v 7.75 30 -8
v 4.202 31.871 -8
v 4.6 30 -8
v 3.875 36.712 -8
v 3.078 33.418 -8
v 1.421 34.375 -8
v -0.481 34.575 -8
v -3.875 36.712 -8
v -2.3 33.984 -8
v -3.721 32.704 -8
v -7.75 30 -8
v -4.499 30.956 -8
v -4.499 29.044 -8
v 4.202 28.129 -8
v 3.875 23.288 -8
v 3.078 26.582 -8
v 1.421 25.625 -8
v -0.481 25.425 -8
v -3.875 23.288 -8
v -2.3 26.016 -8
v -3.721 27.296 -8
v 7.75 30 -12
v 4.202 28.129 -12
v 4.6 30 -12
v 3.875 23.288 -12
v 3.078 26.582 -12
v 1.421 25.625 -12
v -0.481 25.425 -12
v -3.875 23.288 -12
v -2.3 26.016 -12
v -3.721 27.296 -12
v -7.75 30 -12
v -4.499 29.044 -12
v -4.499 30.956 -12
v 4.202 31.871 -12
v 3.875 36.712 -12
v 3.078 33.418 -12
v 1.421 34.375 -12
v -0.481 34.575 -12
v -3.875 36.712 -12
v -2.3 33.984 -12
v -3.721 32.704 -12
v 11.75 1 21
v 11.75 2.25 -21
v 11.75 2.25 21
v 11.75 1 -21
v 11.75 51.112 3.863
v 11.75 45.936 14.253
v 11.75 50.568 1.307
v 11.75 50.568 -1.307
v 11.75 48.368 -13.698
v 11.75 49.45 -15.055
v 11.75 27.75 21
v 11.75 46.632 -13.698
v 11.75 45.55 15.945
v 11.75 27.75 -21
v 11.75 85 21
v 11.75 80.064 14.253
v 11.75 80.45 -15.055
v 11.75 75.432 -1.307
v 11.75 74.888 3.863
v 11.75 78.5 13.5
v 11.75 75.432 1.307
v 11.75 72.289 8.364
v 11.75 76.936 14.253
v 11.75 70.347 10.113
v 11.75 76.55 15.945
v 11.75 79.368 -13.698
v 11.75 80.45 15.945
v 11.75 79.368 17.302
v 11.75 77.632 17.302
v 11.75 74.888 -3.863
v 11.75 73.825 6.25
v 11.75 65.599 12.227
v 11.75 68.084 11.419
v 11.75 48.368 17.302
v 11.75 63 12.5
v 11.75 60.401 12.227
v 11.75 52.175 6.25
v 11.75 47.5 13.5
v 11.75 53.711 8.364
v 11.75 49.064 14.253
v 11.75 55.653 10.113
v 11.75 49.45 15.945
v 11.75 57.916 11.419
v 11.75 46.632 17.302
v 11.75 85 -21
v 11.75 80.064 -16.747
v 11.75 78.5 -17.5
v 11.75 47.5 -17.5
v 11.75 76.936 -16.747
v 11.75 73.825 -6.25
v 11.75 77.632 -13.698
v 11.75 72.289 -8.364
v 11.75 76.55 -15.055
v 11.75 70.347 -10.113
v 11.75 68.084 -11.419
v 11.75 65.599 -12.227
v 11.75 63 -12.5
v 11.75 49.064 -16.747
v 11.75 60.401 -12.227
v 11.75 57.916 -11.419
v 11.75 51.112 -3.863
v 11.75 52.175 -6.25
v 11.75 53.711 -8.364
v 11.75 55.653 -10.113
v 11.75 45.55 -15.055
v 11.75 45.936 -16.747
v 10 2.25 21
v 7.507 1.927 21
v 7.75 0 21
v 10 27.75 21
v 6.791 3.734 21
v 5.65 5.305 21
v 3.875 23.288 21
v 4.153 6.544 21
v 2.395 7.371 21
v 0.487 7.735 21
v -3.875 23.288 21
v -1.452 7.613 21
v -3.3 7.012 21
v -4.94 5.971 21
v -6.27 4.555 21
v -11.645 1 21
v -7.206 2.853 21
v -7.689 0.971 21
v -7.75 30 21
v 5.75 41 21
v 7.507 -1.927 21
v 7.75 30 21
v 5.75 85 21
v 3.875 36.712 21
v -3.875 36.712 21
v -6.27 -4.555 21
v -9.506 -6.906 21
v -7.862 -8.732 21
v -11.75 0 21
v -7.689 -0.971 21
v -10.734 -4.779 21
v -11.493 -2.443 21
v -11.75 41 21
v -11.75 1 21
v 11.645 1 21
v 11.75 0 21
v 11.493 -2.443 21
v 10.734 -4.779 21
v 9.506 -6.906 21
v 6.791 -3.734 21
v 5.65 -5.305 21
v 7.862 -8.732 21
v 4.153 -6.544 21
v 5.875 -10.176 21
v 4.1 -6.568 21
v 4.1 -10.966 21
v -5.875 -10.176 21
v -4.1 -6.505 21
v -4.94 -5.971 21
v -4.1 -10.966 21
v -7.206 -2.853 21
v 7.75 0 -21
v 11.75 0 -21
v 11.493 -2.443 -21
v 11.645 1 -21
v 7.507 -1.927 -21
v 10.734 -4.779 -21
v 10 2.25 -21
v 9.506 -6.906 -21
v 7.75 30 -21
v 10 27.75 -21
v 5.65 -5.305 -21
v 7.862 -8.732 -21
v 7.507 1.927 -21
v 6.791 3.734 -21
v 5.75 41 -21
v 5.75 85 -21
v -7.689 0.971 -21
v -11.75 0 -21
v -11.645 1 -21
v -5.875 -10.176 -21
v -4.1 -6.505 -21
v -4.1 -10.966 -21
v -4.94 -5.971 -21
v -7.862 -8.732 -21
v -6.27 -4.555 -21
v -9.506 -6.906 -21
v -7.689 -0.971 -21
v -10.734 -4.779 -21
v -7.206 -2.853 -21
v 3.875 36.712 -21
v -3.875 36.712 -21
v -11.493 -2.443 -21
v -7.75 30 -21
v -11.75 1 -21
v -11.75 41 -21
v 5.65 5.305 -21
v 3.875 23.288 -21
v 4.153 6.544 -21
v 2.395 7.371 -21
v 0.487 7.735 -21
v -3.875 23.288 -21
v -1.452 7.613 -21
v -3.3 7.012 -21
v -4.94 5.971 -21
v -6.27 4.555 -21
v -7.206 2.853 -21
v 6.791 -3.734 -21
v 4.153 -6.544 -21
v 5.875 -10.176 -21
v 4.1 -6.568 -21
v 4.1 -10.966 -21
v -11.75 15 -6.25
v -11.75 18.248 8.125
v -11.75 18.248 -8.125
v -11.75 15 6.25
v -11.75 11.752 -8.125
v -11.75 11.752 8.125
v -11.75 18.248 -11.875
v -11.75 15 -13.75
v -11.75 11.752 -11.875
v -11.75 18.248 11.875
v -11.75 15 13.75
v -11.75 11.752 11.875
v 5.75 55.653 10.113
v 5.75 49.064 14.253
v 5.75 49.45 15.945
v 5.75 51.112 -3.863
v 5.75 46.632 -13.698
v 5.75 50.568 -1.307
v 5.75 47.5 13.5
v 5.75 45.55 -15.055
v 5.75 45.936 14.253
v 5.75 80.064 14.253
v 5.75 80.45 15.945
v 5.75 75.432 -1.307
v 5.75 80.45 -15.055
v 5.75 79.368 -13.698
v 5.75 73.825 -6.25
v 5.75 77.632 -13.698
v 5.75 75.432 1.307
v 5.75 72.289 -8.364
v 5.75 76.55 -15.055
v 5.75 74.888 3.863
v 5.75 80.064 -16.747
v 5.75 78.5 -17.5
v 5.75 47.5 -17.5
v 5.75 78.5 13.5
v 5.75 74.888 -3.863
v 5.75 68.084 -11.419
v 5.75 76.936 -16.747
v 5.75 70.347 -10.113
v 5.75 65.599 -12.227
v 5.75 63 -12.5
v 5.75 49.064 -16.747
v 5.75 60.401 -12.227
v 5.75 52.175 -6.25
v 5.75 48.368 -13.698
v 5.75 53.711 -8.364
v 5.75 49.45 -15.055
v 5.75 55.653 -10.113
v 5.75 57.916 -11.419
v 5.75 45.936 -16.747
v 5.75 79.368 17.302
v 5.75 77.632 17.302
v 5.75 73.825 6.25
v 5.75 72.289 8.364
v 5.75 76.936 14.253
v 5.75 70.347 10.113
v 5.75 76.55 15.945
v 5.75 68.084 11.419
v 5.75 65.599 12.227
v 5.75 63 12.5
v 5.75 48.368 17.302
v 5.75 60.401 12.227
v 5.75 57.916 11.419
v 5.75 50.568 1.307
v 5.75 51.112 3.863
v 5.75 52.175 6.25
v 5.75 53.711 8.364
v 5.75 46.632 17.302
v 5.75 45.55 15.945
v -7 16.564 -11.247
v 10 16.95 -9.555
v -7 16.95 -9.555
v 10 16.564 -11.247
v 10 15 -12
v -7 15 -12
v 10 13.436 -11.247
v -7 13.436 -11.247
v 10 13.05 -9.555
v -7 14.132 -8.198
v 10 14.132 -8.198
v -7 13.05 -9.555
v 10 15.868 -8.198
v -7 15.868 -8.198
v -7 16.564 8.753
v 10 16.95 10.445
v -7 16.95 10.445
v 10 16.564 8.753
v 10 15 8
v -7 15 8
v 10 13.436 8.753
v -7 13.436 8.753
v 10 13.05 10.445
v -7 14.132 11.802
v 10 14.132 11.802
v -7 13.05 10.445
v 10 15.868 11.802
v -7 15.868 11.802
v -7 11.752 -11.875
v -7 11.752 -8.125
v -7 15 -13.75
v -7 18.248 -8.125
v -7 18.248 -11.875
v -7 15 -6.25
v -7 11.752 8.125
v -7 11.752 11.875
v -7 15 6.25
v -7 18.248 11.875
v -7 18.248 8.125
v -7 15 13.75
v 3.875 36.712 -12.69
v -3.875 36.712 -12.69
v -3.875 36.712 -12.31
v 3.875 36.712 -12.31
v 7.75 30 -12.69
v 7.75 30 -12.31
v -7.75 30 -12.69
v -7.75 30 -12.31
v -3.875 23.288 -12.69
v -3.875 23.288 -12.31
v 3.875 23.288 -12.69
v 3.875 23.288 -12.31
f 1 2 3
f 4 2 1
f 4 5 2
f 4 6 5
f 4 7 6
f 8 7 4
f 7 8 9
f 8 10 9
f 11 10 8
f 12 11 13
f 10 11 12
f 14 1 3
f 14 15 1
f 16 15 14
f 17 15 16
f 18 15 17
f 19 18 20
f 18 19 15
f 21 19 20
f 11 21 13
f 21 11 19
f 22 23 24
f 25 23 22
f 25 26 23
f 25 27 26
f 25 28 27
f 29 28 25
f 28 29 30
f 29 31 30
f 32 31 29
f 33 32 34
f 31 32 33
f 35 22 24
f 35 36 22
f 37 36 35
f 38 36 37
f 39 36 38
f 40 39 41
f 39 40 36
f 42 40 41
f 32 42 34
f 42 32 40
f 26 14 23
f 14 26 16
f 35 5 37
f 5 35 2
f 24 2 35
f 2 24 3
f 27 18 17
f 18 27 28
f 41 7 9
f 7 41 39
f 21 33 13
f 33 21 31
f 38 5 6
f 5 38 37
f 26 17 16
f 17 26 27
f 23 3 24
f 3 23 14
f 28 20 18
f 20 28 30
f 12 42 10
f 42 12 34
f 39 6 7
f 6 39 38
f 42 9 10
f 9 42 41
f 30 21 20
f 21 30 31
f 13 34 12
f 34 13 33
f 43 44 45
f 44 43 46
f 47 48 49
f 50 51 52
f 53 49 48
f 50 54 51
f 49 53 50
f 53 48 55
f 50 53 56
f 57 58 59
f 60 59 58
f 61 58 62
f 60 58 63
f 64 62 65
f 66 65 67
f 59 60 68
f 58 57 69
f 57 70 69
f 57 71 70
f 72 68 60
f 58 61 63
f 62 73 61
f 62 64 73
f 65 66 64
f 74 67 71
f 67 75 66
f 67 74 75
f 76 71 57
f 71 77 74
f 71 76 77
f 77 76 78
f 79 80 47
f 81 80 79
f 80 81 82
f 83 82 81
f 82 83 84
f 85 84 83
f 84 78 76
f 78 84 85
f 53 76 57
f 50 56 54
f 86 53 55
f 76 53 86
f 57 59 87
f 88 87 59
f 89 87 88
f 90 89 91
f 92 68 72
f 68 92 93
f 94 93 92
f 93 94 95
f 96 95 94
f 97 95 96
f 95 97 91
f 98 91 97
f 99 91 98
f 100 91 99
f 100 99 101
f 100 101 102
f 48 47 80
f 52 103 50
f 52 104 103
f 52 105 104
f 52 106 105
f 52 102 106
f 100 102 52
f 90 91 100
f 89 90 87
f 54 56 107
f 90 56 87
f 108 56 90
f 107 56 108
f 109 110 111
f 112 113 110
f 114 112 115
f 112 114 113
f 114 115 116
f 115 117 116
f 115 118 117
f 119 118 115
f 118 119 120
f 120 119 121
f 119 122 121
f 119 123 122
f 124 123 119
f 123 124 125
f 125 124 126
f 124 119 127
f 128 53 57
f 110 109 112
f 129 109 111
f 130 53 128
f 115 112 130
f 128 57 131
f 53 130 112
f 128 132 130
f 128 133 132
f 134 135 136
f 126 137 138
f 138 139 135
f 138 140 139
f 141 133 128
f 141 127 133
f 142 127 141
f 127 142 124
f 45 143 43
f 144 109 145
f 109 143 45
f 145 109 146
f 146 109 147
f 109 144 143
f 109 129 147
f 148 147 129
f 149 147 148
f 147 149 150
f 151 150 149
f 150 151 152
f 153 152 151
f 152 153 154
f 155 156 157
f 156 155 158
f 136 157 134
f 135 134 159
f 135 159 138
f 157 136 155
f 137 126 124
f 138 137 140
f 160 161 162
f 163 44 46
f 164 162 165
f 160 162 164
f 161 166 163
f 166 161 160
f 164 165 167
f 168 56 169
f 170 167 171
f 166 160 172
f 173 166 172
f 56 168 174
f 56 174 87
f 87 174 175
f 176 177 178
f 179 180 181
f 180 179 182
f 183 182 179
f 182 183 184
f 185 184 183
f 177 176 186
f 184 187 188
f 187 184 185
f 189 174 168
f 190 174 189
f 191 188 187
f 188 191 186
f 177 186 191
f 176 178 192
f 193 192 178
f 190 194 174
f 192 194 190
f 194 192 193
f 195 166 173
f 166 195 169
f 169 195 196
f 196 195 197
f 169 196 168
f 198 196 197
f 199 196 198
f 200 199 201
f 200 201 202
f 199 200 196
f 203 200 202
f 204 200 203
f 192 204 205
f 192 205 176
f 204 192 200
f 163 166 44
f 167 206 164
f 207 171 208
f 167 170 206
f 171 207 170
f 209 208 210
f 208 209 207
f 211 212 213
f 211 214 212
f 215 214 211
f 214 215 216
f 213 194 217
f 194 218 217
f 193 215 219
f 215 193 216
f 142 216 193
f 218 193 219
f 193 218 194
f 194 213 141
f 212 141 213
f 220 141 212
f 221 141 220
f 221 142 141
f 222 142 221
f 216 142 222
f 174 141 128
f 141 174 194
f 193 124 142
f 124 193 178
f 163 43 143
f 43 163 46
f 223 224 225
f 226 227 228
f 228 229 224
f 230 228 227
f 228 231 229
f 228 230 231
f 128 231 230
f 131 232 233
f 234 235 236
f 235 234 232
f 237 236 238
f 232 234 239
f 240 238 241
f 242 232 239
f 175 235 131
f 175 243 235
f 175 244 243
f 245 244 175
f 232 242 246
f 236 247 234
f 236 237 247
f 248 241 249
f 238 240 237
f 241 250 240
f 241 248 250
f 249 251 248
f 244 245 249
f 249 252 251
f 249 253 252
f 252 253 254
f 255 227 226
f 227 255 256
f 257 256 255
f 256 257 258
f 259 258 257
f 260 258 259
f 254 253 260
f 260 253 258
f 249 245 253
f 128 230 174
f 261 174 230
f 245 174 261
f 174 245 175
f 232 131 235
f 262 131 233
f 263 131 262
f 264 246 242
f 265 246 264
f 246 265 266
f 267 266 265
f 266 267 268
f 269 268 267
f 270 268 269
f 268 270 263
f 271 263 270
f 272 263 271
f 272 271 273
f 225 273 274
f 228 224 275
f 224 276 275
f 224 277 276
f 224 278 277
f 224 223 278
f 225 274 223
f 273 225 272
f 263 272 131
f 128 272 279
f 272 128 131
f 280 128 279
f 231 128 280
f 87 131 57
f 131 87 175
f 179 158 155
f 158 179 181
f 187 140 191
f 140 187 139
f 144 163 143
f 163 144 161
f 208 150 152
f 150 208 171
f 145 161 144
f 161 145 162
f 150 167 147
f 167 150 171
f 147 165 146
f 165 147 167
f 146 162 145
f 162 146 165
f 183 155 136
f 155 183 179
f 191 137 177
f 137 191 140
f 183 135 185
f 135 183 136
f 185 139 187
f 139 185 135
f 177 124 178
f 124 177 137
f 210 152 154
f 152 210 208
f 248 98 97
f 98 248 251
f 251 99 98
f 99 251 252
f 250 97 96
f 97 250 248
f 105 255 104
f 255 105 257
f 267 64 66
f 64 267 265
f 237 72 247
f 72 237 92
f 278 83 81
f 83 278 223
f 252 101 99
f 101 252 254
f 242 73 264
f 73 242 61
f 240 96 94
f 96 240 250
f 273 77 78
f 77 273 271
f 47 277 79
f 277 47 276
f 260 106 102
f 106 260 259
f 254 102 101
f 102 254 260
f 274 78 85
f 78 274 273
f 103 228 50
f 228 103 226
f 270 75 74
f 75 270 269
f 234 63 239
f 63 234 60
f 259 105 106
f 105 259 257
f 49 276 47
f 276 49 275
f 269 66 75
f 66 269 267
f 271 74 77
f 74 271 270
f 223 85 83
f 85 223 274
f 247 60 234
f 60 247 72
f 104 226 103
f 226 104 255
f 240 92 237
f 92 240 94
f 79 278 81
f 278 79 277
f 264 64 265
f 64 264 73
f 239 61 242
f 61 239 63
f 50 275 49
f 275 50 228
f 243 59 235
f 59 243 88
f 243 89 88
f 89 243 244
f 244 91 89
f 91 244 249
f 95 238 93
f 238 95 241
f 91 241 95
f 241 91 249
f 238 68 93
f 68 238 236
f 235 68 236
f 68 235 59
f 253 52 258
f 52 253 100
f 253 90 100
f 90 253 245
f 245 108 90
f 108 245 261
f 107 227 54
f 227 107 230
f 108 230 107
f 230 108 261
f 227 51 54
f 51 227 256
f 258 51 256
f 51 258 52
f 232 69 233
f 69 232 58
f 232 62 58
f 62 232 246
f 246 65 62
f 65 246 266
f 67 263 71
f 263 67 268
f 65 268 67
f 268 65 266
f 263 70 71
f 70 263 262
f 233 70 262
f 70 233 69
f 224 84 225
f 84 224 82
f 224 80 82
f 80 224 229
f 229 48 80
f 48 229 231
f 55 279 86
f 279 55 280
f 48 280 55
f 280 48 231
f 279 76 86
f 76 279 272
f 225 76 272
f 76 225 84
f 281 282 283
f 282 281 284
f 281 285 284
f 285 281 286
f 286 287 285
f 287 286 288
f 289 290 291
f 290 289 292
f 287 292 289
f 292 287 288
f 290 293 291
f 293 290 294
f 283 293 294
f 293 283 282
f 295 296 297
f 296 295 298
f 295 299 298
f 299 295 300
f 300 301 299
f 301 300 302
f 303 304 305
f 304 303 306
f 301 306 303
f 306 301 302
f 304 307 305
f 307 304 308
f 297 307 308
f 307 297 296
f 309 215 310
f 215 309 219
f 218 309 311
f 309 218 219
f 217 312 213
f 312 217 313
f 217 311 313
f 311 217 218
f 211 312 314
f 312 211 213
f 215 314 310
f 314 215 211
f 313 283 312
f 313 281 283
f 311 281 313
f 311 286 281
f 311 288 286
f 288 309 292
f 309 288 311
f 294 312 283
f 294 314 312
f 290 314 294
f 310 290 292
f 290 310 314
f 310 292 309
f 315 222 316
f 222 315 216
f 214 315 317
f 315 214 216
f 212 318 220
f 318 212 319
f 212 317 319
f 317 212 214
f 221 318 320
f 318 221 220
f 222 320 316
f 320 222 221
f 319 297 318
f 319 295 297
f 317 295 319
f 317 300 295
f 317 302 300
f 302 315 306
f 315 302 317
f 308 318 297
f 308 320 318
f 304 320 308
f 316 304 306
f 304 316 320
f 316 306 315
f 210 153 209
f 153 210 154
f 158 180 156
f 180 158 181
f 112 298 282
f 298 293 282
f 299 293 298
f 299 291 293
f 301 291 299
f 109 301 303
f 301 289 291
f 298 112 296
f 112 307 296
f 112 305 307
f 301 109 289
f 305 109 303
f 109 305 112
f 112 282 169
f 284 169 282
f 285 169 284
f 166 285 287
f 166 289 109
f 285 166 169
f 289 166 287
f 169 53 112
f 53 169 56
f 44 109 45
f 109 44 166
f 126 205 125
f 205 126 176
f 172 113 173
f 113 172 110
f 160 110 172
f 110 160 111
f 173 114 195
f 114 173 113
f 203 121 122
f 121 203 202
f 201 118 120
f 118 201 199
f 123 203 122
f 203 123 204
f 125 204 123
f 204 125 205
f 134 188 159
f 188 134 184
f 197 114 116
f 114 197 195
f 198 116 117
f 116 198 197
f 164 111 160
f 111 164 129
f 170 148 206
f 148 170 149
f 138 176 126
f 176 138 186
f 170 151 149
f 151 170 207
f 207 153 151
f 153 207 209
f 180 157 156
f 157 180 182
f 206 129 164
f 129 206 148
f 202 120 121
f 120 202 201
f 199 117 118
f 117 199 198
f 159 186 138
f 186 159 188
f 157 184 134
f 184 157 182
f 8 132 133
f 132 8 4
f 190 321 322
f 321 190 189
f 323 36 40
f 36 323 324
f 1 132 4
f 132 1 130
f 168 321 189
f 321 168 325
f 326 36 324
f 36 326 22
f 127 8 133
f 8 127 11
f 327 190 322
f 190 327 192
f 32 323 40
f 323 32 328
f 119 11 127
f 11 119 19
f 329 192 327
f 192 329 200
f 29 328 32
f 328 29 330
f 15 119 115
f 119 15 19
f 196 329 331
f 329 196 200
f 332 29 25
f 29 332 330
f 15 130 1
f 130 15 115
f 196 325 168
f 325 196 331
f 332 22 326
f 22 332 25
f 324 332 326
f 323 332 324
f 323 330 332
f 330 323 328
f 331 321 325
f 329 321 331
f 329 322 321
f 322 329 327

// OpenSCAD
// file: Rook_Config.scad
// Rook 3D Printer Configuration
// Created By Jeffrey Olijar 
// Jolijar@gmail.com
// Revision 1.02

// Layer Height
LH = 0.38;

// 608 skate bearing
Bearing_OD = 22.5; 
Bearing_ID = 8;
Bearing_H = 7;

// M3 Nut Diameter
N3 = 7.5;

// M4 Screw Hole Diameter
M4 = 4;

// M5 Screw Hole Diameter
M5 = 5;

// M8 Rod Diameter (configure for a tight fit)
M8 = 8.2;

// M8 Nut Diameter
N8 = 15.5;

//LM8UU Bearing
LBD = 15.5; // Diameter
LBH = 25; // Height
LBI = 8;  // Inner Diameter

//Makergear Groovemount
GVO = 16.5; // Outside Diameter
GVI = 12.5;  // Inside Groove Diameter

// Distance Between Centers for X rods
DBCX = 70;
// main file
// Rook 3D Printer 
// X Motor Holder
// Created By Jeffrey Olijar 
// Jolijar@gmail.com
// Revision 1.00
// 1 x required 

include <Rook_Config.scad> 




module Rook_X_Motor(){
translate(v=[0,30,-12.5]){ 
cube(size = [LBD+4,20,LH], center = true);
}
translate(v=[0,30,-10]){ 
difference(){ 
union(){
cube(size = [LBD+4,20,4], center = true);
}
union(){
translate(v=[0,0,0]){ 
cylinder(h=42,r=M8/2+0.5, center = true);
}
}
}
}







difference(){ 
union(){


translate(v=[0,21,0]){ 
cube(size = [LBD+8,40,42], center = true);
}
translate(v=[LBD/2+1,63,0]){ 
cube(size = [6,44,42], center = true);
}
	
	cylinder(h=42,r=LBD/2+4, center = true);

}
union(){
translate(v=[0,-M8,0]){ 
cube(size = [M8,20,42], center = true);
}

rotate(a=[0,90,0])translate(v=[0,63,0]){ 
cylinder(h=43,r=12.5, center = true);
translate(v=[15.5,15.5,0]){ 
cylinder(h=20,r= M4/2);
}
translate(v=[15.5,-15.5,0]){
cylinder(h=20,r=M4/2);
}
translate(v=[-15.5,15.5,0]){
cylinder(h=20,r=M4/2);
}
translate(v=[-15.5,-15.5,0]){
cylinder(h=20,r=M4/2);
}
translate(v=[10,-48,-20]){
cylinder(h=50,r=M4/2);
}
translate(v=[-10,-48,-20]){
cylinder(h=50,r=M4/2);
}
translate(v=[10,-48,-32]){
cylinder(h=50,r=N3/2,$fn=6, center = true);
}
translate(v=[-10,-48,-32]){
cylinder(h=50,r=N3/2,$fn=6, center = true);
}
}







//x rod cutout
translate(v=[20,15,0]){ 
cube(size = [20,25.5,42], center = true);
}








	cylinder(h=43,r=LBD/2, center = true);
translate(v=[0,30,0]){ 
		cylinder(h=43,r=N8/2,$fn=6, center = true);
}


}

}






}











Rook_X_Motor();
